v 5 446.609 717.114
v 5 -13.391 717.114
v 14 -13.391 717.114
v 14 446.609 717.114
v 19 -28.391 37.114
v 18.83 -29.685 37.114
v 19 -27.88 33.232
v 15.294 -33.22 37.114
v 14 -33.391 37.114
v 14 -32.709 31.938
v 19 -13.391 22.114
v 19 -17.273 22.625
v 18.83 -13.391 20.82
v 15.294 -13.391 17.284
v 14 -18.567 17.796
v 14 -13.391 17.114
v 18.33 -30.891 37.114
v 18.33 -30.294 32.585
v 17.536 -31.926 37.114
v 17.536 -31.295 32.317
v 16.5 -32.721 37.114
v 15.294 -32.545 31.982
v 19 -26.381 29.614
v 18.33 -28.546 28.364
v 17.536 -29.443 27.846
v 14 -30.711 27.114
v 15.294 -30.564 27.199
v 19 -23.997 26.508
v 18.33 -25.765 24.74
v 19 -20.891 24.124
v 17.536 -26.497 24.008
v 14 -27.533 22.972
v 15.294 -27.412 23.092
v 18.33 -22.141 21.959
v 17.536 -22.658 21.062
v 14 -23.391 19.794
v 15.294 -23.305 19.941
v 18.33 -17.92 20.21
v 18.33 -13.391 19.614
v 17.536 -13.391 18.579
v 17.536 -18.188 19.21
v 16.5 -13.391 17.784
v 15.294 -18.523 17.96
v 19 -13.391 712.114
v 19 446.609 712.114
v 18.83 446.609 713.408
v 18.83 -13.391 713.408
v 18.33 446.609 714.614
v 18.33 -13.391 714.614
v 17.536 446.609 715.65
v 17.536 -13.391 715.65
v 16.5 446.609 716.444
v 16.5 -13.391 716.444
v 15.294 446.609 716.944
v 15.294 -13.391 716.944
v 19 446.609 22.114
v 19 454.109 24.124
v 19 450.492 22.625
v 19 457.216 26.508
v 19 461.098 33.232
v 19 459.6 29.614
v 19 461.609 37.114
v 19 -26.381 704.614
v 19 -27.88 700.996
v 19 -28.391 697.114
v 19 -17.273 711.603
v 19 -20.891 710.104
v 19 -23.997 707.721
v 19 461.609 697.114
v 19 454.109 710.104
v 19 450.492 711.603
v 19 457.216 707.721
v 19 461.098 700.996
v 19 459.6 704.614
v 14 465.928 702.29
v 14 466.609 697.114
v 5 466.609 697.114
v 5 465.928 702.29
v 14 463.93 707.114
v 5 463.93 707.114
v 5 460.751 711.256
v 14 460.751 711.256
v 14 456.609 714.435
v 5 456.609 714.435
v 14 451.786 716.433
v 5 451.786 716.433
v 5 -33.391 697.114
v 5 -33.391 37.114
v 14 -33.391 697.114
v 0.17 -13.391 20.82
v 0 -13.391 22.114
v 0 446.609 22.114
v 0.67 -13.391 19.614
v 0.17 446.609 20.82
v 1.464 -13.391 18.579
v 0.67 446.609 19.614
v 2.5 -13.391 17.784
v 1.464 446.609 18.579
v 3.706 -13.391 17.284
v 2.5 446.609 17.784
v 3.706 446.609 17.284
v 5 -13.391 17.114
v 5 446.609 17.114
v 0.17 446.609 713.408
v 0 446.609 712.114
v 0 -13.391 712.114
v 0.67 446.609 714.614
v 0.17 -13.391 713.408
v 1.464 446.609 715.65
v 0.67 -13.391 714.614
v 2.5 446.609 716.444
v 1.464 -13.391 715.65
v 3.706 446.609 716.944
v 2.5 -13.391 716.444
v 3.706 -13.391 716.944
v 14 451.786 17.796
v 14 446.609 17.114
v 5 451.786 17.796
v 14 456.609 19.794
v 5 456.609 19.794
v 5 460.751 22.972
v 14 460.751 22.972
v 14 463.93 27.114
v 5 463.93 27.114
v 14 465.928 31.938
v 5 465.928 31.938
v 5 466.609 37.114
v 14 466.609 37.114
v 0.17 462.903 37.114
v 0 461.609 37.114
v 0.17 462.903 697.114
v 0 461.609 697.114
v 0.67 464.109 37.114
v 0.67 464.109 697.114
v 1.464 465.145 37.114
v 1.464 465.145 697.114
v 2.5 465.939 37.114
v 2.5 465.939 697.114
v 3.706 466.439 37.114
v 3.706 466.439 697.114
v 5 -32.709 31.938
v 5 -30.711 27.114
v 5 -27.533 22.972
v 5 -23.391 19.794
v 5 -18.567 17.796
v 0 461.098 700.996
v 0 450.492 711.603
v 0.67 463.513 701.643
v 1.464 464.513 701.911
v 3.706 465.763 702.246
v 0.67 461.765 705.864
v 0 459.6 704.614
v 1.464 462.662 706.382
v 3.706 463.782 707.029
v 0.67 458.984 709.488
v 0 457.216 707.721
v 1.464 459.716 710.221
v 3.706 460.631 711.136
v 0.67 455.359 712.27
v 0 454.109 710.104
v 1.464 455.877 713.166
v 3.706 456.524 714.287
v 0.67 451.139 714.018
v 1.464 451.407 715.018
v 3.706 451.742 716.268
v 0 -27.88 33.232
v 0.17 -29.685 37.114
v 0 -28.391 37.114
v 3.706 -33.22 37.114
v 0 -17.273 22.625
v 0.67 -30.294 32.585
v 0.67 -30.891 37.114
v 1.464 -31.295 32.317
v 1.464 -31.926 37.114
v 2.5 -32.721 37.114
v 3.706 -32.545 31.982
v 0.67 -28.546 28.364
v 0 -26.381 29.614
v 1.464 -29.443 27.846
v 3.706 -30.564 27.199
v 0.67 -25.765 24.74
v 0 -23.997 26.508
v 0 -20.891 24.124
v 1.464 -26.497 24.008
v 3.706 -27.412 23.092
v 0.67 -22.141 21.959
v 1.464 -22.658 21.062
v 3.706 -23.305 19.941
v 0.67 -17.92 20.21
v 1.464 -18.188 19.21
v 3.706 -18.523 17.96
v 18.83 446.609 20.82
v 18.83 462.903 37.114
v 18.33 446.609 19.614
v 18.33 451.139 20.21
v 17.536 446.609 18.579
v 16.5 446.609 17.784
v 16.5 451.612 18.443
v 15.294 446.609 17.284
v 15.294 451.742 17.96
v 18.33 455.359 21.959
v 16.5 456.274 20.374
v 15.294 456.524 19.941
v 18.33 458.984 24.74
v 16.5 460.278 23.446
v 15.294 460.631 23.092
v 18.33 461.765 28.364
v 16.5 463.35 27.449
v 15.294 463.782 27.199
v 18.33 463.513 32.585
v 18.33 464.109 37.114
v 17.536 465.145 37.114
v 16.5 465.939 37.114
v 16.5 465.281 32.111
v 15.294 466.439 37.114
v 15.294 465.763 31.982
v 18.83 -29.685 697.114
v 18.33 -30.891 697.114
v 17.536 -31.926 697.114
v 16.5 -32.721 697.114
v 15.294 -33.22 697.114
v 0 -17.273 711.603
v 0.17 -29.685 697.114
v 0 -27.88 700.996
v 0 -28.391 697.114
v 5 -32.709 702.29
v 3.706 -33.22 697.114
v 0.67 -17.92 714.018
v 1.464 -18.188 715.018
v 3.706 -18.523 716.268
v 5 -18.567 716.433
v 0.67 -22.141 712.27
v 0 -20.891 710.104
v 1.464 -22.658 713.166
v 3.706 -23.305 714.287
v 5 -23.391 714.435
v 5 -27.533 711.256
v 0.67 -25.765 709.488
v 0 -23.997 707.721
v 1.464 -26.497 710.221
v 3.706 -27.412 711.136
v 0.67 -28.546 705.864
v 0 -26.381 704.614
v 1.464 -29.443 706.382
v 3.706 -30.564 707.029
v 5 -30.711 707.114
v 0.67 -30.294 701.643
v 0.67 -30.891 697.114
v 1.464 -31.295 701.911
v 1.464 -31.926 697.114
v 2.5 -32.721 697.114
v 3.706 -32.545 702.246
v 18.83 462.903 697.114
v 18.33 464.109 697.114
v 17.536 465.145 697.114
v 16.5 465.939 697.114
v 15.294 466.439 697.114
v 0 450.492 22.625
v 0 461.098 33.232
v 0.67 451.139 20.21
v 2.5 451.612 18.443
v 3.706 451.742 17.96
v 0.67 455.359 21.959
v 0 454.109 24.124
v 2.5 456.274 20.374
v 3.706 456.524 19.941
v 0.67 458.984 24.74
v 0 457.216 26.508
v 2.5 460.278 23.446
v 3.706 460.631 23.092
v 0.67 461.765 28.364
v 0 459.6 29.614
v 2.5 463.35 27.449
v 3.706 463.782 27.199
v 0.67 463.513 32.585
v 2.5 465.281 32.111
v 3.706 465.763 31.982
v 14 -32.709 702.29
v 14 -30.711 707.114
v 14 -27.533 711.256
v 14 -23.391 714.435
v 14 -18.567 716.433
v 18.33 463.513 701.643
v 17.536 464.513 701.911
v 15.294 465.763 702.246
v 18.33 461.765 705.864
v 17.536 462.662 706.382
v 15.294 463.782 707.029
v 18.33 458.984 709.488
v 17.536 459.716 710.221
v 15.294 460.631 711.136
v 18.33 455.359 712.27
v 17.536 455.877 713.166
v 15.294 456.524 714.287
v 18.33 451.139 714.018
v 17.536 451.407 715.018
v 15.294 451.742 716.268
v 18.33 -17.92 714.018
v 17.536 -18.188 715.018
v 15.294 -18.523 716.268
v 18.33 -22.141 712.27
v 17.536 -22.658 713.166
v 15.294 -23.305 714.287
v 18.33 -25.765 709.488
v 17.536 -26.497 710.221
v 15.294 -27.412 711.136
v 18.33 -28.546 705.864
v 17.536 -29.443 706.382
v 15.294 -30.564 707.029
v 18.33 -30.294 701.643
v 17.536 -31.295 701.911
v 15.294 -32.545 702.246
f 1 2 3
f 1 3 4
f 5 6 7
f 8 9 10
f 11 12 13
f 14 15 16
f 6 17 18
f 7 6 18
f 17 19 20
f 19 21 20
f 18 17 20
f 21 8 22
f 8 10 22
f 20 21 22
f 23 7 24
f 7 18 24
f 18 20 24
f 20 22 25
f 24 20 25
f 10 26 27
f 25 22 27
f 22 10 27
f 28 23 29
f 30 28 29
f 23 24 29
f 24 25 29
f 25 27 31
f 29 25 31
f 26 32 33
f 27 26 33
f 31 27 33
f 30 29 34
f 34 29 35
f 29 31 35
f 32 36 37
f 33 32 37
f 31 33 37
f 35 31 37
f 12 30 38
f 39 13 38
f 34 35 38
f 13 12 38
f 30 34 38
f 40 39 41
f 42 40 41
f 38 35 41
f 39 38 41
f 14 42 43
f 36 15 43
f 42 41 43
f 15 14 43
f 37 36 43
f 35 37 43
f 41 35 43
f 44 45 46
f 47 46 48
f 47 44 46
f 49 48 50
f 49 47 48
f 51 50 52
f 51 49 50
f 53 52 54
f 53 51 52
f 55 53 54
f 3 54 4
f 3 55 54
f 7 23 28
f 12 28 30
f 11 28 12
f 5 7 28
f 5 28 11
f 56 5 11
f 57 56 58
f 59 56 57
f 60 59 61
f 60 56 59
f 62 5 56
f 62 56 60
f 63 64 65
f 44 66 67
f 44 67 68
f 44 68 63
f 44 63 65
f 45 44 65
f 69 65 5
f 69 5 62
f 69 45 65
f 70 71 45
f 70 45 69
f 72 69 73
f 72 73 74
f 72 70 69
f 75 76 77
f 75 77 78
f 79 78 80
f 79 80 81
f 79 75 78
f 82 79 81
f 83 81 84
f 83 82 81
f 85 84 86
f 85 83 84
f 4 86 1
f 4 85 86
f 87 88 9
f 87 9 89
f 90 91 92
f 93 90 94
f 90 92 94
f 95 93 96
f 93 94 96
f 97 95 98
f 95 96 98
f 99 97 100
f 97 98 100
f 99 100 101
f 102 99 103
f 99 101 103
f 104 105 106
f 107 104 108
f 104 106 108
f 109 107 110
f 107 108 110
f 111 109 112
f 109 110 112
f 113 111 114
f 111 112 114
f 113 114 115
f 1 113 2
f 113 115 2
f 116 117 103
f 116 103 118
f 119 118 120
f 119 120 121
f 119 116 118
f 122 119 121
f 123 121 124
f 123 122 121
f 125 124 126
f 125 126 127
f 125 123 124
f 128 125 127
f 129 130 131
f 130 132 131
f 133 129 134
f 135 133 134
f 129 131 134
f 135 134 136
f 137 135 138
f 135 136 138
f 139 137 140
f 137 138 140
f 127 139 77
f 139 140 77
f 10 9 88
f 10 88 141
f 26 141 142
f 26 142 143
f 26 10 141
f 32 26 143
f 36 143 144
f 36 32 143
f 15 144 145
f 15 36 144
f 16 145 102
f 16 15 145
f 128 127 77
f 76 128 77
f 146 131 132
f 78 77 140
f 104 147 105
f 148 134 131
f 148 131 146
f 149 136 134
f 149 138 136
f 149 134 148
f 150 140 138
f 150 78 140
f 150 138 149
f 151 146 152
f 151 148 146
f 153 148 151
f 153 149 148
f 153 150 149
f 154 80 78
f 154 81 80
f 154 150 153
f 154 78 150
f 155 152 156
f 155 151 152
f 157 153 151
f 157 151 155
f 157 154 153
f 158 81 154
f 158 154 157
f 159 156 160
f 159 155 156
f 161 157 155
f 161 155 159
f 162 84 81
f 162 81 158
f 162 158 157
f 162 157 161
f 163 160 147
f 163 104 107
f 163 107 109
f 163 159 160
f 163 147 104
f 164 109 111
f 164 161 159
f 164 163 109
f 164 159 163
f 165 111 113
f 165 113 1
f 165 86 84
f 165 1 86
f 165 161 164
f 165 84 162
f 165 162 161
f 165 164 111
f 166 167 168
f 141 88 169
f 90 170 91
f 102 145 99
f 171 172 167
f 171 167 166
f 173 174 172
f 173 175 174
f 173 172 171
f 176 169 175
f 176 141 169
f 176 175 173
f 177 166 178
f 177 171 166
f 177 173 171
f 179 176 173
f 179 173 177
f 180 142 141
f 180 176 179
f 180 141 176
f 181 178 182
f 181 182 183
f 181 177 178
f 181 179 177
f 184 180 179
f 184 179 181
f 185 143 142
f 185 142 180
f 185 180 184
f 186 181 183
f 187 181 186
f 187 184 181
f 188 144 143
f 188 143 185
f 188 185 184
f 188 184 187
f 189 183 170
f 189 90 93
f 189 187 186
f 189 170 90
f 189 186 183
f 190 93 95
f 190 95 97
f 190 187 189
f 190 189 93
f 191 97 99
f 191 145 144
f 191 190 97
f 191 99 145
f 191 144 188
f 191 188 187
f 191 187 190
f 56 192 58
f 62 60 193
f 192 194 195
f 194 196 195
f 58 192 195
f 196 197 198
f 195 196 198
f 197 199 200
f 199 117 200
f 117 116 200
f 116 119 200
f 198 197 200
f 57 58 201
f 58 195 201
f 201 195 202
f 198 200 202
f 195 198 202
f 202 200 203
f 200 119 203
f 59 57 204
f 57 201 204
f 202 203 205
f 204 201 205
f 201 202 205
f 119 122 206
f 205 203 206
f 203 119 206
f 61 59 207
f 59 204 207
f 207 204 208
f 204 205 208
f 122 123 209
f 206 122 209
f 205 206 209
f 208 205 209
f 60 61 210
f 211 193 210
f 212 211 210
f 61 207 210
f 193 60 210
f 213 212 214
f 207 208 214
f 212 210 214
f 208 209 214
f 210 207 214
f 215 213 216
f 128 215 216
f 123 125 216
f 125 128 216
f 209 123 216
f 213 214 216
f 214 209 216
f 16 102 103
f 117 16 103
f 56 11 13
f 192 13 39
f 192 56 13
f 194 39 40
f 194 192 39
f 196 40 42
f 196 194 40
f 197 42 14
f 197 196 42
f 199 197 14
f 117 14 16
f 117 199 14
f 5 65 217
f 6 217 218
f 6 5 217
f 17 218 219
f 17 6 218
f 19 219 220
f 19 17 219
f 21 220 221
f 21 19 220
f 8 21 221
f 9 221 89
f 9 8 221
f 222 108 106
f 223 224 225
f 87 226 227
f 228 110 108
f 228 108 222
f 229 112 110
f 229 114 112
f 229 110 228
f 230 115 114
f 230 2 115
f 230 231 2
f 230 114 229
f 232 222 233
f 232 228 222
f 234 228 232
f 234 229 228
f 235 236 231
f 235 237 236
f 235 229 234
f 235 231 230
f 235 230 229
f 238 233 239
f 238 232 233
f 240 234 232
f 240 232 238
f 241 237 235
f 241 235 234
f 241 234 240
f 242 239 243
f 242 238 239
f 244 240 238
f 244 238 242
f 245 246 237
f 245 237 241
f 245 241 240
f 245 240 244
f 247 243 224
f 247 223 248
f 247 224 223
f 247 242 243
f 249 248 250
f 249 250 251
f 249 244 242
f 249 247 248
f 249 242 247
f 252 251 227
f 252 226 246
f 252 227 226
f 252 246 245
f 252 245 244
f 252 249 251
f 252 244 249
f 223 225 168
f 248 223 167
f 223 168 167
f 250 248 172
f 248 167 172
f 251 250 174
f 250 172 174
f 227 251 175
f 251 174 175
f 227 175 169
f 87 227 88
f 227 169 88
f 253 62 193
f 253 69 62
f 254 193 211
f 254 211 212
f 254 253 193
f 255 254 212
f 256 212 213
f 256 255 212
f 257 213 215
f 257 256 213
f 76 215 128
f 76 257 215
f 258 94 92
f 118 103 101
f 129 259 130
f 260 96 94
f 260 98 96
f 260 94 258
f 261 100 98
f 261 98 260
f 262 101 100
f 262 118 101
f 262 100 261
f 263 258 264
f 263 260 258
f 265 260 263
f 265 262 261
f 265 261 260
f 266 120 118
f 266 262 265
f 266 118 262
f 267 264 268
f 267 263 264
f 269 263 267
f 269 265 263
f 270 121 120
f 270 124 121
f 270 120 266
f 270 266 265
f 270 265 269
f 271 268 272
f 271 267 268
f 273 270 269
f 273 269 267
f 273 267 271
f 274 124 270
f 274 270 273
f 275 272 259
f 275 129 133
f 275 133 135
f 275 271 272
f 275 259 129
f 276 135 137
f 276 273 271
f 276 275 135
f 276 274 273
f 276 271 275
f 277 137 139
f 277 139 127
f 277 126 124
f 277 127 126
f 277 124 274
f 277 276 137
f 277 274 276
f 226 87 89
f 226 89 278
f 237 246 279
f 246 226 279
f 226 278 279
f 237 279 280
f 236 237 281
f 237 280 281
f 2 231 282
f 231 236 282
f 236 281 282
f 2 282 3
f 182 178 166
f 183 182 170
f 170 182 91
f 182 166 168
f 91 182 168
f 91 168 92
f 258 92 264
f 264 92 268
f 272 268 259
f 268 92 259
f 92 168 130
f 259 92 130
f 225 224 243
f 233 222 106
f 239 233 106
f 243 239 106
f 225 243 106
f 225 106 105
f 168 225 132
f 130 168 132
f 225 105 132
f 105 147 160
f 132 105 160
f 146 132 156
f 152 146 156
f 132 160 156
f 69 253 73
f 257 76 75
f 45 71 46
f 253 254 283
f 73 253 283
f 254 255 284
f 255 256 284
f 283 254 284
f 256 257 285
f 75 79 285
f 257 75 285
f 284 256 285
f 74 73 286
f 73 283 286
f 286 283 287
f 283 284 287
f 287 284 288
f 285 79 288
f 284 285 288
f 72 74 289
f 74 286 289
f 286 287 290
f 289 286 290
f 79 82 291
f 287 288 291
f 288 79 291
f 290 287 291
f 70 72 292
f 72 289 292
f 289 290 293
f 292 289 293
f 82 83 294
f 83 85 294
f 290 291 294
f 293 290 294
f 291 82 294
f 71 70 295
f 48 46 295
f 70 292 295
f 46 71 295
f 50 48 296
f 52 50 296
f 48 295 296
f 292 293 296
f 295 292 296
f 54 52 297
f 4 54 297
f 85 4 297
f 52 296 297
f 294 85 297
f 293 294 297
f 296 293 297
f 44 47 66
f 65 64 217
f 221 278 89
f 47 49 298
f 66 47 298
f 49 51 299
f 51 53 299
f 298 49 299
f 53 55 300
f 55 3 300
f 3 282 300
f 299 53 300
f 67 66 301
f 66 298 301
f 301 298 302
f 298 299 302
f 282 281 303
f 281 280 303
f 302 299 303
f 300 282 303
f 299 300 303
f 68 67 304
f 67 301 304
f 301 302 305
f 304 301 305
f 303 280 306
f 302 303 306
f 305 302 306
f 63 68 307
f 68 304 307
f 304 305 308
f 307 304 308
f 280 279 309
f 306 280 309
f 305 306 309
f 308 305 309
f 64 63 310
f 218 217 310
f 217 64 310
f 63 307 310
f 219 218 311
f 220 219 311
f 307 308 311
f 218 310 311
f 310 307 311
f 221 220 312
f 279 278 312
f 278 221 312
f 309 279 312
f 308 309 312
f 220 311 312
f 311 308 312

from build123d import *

# Parameters (mm, degrees)
F0_W     = 500
F0_H     = 700
F1_DEPTH = 19
F2_R     = 20
F3_R     = 5


with BuildPart() as f1:
    # F0 (on Right) → F1 (new body)
    with BuildSketch(Plane.YZ):
        with Locations((216.609364, 367.114102)):
            Rectangle(F0_W, F0_H)
    extrude(amount=F1_DEPTH)

    # F2
    f2_edges = [f1.edges().sort_by_distance(p)[0] for p in [
        (9.5, -33.390636, 717.114102),
        (9.5, -33.390636, 17.114102),
        (9.5, 466.609364, 17.114102),
        (9.5, 466.609364, 717.114102),
    ]]
    fillet(f2_edges, radius=F2_R)

    # F3
    f3_edges = [f1.edges().sort_by_distance(p)[0] for p in [
        (0, 466.609364, 367.114102),
        (19, 466.609364, 367.114102),
    ]]
    fillet(f3_edges, radius=F3_R)


solid = f1.part
